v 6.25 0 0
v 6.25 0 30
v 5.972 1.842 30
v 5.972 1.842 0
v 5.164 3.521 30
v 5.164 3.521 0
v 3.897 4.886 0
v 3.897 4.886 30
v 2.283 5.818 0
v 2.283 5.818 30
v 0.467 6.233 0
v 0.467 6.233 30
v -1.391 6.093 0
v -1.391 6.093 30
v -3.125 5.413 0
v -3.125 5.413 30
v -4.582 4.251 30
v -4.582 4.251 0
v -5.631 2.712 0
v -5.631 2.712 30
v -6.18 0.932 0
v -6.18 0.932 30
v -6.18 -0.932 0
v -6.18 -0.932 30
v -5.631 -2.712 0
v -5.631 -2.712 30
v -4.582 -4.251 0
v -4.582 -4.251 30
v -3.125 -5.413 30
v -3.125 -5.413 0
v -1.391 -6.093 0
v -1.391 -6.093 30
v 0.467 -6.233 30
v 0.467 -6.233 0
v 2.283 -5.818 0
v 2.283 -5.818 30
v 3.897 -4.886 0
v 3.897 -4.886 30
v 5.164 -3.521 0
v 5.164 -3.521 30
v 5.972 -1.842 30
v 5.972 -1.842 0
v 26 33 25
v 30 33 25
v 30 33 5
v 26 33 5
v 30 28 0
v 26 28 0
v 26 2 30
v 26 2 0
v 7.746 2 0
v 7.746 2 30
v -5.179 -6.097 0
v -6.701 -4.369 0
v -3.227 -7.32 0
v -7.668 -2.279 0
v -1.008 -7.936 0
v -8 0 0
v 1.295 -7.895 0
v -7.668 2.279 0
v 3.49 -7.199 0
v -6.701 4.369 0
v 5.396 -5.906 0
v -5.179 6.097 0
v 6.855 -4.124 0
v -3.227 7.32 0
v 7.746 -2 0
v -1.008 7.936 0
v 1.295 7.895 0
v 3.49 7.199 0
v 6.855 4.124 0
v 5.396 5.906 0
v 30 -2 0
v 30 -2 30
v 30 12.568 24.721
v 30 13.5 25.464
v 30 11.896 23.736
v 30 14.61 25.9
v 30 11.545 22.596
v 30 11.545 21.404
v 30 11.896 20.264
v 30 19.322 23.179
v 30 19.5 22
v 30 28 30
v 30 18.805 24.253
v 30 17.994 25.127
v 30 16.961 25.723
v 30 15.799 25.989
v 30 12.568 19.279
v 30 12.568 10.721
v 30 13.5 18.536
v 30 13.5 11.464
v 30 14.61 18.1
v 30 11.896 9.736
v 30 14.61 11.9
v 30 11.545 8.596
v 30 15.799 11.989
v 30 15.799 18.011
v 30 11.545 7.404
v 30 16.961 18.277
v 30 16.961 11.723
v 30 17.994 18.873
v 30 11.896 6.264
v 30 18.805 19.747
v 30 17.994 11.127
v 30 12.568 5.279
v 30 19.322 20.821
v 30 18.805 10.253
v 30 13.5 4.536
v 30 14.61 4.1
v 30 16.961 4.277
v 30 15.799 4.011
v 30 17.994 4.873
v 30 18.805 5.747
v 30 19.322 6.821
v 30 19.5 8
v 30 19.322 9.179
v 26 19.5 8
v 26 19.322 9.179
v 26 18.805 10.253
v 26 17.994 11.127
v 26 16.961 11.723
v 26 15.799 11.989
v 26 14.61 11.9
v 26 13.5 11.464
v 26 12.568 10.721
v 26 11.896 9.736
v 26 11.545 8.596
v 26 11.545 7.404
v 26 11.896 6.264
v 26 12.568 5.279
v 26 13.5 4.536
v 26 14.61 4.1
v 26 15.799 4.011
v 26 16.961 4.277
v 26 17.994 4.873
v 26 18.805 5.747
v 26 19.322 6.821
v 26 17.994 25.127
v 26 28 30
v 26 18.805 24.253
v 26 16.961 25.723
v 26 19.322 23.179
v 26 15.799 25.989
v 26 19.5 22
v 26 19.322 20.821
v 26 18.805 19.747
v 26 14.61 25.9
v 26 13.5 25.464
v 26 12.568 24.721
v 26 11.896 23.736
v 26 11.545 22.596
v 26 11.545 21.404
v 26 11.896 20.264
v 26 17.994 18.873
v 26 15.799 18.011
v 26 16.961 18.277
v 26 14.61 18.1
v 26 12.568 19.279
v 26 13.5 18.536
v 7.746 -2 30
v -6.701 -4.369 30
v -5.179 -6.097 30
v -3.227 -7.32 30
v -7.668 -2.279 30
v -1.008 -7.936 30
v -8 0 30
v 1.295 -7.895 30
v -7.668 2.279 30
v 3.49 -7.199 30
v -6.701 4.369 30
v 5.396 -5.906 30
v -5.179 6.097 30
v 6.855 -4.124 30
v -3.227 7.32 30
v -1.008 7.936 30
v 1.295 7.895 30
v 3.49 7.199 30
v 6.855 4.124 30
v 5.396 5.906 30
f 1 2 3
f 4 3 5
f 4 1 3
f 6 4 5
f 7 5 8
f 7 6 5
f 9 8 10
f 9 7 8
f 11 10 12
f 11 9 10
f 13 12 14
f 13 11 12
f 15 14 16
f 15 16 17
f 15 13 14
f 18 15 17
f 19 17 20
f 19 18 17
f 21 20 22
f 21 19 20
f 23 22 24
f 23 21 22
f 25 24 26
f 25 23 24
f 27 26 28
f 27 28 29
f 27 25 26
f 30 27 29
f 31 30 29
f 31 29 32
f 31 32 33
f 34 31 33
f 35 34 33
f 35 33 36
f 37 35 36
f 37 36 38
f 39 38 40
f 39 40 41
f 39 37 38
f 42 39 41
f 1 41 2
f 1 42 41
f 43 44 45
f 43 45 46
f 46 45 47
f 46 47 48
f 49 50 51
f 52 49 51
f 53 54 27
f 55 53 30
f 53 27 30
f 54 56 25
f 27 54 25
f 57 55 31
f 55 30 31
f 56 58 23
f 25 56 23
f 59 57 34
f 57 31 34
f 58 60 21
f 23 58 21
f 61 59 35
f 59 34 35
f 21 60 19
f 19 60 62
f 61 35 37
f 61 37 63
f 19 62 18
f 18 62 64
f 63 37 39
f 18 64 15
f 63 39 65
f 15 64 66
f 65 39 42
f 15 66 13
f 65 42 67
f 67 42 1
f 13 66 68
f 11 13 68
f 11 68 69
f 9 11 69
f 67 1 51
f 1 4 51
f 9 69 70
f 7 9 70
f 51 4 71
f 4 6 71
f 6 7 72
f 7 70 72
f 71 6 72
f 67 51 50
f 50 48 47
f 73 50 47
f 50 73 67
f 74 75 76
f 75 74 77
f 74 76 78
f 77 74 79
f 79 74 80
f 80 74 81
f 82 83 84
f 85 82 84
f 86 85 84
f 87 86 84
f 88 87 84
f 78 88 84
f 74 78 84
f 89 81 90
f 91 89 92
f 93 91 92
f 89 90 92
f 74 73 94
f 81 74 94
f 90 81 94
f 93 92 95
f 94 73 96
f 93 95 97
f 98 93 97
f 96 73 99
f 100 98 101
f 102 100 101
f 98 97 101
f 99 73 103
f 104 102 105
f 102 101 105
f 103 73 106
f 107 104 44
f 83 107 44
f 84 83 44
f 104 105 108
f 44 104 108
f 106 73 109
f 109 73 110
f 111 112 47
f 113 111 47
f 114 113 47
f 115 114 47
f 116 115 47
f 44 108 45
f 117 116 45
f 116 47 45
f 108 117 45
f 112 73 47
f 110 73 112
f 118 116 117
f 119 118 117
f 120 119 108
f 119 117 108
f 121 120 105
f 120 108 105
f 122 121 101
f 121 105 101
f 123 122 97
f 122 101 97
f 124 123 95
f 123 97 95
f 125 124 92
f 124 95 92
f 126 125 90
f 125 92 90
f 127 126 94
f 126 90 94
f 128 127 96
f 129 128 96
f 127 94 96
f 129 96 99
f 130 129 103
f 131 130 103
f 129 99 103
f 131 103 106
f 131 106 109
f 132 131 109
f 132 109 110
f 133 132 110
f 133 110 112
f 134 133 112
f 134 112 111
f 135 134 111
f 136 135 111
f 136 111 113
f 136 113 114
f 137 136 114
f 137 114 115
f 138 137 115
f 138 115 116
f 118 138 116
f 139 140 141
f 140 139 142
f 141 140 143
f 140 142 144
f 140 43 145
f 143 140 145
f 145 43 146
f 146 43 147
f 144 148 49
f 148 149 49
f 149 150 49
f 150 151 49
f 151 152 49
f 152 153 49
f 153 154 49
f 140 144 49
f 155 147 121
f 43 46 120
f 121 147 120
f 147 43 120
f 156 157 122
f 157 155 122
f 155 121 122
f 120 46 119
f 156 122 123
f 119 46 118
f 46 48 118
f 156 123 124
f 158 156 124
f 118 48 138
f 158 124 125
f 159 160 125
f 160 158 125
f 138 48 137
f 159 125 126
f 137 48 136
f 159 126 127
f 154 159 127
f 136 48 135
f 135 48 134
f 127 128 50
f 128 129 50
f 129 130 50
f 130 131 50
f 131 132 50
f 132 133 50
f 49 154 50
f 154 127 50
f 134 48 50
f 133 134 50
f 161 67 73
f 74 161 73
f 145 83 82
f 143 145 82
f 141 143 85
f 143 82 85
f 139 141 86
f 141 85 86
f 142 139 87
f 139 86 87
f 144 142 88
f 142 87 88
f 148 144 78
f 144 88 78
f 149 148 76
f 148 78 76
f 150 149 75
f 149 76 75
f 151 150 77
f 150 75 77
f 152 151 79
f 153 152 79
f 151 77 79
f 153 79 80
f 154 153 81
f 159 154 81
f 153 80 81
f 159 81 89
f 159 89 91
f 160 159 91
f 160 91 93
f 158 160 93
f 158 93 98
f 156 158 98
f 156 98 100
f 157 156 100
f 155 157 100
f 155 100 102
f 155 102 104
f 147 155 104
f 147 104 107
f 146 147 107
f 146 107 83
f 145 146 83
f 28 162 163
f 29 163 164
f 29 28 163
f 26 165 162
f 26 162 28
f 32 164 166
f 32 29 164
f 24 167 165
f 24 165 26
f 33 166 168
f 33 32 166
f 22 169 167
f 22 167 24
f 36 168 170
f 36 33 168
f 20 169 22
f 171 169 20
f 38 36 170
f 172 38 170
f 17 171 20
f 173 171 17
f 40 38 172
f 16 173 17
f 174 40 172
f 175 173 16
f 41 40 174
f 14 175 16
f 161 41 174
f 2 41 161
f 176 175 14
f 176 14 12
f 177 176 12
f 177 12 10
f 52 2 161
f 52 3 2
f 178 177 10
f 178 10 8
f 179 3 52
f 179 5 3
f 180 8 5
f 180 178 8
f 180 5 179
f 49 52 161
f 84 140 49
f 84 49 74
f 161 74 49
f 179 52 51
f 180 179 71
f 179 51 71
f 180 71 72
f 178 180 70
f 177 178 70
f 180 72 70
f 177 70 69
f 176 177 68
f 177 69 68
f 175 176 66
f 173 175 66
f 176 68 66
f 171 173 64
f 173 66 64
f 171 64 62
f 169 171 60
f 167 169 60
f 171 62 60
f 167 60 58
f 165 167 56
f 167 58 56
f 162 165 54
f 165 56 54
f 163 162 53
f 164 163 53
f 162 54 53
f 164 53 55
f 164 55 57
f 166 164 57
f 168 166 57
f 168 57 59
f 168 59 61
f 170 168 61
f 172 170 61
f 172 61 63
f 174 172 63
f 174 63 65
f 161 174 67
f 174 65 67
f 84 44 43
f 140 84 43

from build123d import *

# Parameters (mm, degrees)
F0_R     = 6.25
F1_DEPTH = 30
F2_R     = 4
F3_DEPTH = 38.001
F4_SIZE  = 5


with BuildPart() as f1:
    # F0 (on Top) → F1 (new body)
    with BuildSketch(Plane.XY):
        with BuildLine():
            Line((26, 2), (7.745967, 2))
            ThreePointArc((7.745967, 2), (-8, 0), (7.745967, -2))
            Line((7.745967, -2), (26, -2))
            Line((26, -2), (30, -2))
            Line((30, -2), (30, 2))
            Line((30, 2), (30, 33))
            Line((30, 33), (26, 33))
            Line((26, 33), (26, 2))
        make_face()
        Circle(F0_R, mode=Mode.SUBTRACT)
    extrude(amount=F1_DEPTH)

    # F2 (on face) → F3 (cut, through all)
    with BuildSketch(Plane.YZ.offset(30)):
        with Locations((15.5, 22)):
            Circle(F2_R)
        with Locations((15.5, 8)):
            Circle(F2_R)
    extrude(amount=-F3_DEPTH, mode=Mode.SUBTRACT)

    # F4
    f4_edges = [f1.edges().sort_by_distance(p)[0] for p in [
        (28, 33, 30),
        (28, 33, 0),
    ]]
    chamfer(f4_edges, length=F4_SIZE)


solid = f1.part
